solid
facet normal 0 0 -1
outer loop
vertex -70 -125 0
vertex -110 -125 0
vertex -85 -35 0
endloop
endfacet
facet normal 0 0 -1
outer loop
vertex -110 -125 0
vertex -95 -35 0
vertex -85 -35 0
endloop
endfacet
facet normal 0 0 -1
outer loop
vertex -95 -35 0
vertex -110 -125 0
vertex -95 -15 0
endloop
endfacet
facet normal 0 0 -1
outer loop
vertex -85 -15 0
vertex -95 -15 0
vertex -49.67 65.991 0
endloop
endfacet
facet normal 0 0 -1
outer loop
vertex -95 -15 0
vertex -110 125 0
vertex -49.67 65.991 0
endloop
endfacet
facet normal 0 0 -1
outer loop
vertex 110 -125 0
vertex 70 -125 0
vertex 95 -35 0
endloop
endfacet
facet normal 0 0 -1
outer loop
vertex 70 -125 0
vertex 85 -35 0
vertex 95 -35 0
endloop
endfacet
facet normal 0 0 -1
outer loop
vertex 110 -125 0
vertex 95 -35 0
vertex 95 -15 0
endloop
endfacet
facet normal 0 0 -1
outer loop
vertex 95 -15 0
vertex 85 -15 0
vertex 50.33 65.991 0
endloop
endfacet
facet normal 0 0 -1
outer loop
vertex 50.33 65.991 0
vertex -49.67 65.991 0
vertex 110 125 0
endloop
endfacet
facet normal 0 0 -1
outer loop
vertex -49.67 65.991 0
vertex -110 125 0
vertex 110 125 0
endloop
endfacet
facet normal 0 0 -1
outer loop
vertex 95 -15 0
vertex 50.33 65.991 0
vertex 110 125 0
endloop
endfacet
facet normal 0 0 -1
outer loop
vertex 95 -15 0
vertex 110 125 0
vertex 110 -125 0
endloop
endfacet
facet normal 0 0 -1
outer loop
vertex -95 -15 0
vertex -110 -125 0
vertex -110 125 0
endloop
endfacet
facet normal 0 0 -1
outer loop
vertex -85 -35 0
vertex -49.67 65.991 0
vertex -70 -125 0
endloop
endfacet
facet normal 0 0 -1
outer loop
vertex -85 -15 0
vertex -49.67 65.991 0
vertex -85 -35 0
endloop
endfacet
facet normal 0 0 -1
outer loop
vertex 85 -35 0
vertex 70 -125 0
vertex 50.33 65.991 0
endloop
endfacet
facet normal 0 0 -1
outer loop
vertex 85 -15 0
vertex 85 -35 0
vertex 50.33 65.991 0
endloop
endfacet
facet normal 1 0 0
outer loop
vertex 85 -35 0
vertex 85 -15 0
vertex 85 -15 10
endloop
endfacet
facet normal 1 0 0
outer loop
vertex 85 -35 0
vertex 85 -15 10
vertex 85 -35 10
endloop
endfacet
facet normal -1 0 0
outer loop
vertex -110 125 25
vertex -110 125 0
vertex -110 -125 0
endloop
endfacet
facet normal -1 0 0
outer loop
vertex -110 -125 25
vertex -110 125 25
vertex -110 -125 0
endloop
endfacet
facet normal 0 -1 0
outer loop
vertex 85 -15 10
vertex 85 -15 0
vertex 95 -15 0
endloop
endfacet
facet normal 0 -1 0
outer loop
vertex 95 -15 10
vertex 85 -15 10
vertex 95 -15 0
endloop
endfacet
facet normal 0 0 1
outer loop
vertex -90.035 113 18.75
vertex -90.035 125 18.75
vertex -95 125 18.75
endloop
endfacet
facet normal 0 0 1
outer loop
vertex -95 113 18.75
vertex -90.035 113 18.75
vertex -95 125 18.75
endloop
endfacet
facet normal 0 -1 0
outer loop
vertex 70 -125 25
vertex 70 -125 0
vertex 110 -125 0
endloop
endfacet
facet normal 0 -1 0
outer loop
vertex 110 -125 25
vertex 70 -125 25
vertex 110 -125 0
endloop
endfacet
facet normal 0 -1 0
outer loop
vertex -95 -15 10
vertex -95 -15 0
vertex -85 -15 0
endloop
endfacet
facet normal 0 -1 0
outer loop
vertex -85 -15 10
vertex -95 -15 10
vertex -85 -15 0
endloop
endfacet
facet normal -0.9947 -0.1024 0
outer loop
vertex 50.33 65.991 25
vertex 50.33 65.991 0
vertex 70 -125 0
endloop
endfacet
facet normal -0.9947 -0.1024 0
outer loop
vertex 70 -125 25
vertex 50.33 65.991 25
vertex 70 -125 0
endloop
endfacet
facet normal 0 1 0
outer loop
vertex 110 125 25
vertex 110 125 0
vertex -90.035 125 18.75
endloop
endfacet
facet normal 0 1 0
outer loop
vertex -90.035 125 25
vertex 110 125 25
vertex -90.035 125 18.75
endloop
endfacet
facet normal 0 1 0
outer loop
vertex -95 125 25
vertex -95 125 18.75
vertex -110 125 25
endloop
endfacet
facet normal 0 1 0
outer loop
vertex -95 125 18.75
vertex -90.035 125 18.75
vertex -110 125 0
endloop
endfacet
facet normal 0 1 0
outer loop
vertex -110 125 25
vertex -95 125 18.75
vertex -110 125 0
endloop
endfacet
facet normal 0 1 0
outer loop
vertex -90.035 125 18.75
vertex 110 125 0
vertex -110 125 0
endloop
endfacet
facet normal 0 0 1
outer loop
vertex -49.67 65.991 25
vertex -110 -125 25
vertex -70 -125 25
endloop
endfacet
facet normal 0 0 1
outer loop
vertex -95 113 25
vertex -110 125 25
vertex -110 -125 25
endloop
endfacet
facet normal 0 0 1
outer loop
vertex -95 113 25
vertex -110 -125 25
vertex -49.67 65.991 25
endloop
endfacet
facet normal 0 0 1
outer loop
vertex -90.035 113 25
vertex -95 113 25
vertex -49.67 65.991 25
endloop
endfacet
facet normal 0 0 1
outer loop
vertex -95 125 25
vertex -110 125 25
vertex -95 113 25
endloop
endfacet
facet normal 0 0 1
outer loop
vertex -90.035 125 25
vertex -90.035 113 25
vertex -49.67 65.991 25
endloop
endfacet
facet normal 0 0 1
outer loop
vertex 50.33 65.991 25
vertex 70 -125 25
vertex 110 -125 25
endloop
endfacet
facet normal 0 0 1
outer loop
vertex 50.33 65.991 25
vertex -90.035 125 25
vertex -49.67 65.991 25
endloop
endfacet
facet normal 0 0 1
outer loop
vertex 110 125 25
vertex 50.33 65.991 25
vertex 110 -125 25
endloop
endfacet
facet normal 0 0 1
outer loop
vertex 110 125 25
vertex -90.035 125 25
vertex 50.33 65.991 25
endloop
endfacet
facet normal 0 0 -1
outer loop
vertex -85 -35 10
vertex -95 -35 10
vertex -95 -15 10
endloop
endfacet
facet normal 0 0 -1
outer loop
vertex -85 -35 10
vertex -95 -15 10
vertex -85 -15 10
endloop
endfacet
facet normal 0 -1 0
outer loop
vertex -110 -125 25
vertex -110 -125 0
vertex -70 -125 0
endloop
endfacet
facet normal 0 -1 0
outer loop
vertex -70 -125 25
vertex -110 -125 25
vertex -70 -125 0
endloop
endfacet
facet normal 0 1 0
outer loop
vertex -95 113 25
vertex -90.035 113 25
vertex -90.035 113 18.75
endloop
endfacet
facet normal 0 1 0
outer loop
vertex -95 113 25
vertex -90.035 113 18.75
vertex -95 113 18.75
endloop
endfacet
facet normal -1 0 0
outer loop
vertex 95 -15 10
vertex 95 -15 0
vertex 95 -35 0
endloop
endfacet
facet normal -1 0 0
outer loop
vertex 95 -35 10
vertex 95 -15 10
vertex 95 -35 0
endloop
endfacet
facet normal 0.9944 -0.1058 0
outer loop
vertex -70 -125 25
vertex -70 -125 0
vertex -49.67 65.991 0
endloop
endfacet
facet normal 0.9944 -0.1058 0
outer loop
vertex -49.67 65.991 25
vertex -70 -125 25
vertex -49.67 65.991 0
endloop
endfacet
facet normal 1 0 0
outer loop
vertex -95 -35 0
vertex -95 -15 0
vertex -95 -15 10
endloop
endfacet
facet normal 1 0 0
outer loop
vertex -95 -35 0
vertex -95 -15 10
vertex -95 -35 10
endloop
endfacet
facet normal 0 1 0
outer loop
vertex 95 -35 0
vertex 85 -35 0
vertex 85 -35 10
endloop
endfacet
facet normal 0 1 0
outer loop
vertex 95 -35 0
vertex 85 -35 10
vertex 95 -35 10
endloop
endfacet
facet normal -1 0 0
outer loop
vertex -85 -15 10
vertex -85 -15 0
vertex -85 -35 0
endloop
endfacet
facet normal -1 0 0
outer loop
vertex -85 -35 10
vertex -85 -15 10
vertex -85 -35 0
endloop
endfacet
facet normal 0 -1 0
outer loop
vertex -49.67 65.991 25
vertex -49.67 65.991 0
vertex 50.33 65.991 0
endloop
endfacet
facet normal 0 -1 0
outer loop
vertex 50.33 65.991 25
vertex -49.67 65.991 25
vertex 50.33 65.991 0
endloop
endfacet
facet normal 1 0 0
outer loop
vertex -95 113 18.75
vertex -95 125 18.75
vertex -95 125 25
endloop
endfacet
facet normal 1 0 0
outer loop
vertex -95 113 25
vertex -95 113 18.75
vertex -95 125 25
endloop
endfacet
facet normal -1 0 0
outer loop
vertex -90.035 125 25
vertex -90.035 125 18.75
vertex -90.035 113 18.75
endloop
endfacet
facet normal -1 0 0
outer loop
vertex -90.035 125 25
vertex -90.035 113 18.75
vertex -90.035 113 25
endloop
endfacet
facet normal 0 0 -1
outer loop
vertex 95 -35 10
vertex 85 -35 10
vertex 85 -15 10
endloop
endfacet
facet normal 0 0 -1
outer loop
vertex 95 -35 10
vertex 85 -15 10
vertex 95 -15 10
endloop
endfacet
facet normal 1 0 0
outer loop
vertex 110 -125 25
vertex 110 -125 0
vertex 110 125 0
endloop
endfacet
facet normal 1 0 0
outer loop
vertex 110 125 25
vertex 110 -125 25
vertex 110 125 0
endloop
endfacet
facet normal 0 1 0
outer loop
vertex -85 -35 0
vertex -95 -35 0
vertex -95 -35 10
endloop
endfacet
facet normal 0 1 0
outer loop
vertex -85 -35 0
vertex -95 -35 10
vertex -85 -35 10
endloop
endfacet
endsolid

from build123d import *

# Parameters (mm, degrees)
F1_DEPTH = 25
F2_W     = 4.965493
F2_H     = 6.25
F3_DEPTH = 12
F4_W     = 10
F4_H     = 20
F5_DEPTH = 10


with BuildPart() as f1:
    # F0 (on Top) → F1 (new body)
    with BuildSketch(Plane.XY):
        Polygon((110, -125), (110, 125), (-110, 125), (-110, -125), (-70, -125), (-49.67048, 65.990649), (50.32952, 65.990649), (70, -125), align=None)
    extrude(amount=F1_DEPTH)

    # F2 (on face) → F3 (cut)
    with BuildSketch(Plane(origin=(0, 125, 0), x_dir=(-1, 0, 0), z_dir=(0, 1, 0))):
        with Locations((92.517253, 21.875)):
            Rectangle(F2_W, F2_H)
    extrude(amount=-F3_DEPTH, mode=Mode.SUBTRACT)

    # F4 (on face) → F5 (cut)
    with BuildSketch(Plane(origin=(0, 0, 0), x_dir=(1, 0, 0), z_dir=(0, 0, -1))):
        with Locations((-90, 25)):
            Rectangle(F4_W, F4_H)
        with Locations((90, 25)):
            Rectangle(F4_W, F4_H)
    extrude(amount=-F5_DEPTH, mode=Mode.SUBTRACT)


solid = f1.part
